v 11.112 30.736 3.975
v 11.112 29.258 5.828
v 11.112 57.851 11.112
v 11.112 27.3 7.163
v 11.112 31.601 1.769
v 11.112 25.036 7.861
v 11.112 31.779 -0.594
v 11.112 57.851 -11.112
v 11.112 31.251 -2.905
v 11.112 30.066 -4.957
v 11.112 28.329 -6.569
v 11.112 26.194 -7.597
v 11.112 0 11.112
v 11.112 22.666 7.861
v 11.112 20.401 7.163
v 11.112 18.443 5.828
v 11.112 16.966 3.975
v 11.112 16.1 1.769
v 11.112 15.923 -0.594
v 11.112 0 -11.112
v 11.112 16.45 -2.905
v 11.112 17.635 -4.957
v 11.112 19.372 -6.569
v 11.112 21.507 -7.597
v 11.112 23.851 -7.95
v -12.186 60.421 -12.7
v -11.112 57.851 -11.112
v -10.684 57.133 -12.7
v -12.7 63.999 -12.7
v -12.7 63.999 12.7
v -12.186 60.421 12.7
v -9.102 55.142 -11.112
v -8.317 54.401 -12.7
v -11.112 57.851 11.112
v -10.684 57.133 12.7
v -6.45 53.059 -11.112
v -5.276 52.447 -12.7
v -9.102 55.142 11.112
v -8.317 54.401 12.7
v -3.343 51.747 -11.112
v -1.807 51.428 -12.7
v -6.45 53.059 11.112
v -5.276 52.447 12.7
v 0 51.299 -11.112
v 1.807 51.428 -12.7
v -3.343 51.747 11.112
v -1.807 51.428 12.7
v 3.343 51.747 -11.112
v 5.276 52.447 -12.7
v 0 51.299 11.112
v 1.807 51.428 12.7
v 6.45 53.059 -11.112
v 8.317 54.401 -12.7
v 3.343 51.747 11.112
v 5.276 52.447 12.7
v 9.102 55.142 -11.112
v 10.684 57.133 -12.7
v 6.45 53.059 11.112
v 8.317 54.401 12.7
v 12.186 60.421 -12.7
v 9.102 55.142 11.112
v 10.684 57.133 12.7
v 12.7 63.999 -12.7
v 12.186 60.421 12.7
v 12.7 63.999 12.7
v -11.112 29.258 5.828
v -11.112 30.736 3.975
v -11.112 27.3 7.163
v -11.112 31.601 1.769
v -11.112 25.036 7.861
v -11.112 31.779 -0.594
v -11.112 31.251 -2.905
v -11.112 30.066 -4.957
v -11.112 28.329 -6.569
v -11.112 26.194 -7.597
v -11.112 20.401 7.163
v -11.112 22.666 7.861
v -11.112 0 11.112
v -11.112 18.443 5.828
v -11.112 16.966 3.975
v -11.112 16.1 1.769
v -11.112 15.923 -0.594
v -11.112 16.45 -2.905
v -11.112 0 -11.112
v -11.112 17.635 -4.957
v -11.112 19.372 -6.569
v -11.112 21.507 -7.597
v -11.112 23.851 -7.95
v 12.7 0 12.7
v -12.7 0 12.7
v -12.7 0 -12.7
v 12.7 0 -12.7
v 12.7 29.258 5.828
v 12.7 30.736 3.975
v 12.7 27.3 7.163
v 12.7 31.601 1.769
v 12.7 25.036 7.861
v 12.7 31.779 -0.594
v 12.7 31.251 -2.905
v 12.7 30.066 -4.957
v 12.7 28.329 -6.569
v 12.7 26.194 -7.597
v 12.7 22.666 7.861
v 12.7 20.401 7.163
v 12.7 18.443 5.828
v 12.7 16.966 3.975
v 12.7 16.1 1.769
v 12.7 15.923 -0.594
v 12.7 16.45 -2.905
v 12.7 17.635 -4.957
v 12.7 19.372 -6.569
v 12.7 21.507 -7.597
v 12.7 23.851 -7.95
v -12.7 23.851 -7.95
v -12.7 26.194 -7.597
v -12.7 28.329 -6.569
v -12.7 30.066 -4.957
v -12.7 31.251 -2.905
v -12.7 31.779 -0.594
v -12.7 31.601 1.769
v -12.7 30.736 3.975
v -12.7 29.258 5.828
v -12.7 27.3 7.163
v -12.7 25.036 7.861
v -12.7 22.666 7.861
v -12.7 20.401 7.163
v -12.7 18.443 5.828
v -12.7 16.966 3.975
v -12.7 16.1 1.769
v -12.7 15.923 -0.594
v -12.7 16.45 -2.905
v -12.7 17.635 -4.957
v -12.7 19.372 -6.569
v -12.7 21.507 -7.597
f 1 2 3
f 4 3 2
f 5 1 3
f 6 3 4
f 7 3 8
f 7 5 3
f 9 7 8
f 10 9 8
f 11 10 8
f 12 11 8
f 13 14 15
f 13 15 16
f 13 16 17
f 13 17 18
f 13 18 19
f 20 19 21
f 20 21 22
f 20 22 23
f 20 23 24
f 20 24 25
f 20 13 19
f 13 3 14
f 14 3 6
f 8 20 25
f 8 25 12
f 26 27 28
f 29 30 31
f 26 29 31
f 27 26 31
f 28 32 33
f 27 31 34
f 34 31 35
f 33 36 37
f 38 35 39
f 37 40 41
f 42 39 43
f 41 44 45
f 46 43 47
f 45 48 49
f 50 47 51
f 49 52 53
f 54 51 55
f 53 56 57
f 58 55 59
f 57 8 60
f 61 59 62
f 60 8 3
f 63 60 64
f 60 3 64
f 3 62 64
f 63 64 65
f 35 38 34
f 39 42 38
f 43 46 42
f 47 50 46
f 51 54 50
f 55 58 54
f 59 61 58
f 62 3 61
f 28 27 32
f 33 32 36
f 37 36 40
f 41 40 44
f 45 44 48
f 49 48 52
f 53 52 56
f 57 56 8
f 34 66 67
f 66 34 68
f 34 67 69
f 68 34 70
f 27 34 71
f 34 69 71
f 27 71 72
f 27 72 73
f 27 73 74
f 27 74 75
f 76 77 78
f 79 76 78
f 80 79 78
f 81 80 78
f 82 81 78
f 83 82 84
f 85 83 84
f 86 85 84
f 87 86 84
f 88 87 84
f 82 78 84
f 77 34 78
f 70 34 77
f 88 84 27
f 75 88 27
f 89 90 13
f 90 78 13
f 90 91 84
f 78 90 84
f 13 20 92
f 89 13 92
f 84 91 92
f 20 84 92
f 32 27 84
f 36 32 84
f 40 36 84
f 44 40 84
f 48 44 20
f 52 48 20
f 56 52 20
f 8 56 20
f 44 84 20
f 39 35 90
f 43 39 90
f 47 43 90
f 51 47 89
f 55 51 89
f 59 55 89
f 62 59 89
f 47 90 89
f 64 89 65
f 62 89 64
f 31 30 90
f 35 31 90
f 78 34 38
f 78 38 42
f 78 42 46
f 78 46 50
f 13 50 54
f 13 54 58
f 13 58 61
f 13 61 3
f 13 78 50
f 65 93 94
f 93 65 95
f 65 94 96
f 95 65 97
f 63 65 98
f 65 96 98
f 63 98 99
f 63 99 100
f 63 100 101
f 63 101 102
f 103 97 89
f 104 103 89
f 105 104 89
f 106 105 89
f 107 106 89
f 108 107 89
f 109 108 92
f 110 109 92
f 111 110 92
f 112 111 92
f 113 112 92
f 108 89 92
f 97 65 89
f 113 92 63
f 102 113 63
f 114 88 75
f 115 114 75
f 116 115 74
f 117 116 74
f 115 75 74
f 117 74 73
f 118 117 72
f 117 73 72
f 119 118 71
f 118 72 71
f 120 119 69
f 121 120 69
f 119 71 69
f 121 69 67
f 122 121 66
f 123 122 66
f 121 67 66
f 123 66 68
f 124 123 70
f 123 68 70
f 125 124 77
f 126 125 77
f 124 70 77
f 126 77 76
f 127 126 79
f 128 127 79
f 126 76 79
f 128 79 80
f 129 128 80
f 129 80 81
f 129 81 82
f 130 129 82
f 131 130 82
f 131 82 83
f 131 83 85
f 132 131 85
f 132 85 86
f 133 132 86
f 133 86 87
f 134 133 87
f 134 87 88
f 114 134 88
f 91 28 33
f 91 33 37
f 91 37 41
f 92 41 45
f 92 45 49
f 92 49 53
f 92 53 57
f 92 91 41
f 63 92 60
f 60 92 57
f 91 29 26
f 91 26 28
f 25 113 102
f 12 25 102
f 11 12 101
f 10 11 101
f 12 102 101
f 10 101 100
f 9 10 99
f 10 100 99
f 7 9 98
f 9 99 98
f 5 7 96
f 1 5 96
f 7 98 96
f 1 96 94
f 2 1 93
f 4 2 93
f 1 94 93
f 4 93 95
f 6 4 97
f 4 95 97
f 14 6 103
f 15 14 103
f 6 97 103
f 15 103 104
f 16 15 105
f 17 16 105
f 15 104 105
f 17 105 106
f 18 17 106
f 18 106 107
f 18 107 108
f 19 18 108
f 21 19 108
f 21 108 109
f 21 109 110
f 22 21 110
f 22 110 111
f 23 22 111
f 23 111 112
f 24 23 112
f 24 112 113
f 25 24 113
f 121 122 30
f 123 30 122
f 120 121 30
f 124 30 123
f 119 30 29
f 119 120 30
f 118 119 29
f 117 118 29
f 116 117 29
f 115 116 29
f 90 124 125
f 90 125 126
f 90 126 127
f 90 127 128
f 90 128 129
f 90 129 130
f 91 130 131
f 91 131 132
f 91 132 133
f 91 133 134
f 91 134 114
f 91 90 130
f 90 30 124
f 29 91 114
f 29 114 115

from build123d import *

# Parameters (mm, degrees)
SKETCH1_W           = 25.4
SKETCH1_H           = 25.4
SKETCH1_W_2         = 22.225
SKETCH1_H_2         = 22.225
BOSS_EXTRUDE1_DEPTH = 63.99895
SKETCH2_R           = 12.7
CUT_EXTRUDE1_DEPTH  = 71.016538054
SKETCH3_R           = 7.9502
CUT_EXTRUDE2_DEPTH  = 71.016538223


with BuildPart() as part:
    # Sketch1 → Boss-Extrude1 (new body)
    with BuildSketch(Plane(origin=(0, 0, 0), x_dir=(1, 0, 0), z_dir=(0, 1, 0))):
        Rectangle(SKETCH1_W, SKETCH1_H)
        Rectangle(SKETCH1_W_2, SKETCH1_H_2, mode=Mode.SUBTRACT)
    extrude(amount=BOSS_EXTRUDE1_DEPTH)

    # Sketch2 → Cut-Extrude1 (cut, through all)
    with BuildSketch(Plane.XY.offset(12.7)):
        with Locations((0, 63.998950185)):
            Circle(SKETCH2_R)
    extrude(amount=-CUT_EXTRUDE1_DEPTH, mode=Mode.SUBTRACT)

    # Sketch3 → Cut-Extrude2 (cut, through all)
    with BuildSketch(Plane(origin=(12.7, 0, 0), x_dir=(0, 0, -1), z_dir=(1, 0, 0))):
        with Locations((0, 23.8506)):
            Circle(SKETCH3_R)
    extrude(amount=-CUT_EXTRUDE2_DEPTH, mode=Mode.SUBTRACT)


solid = part.part
